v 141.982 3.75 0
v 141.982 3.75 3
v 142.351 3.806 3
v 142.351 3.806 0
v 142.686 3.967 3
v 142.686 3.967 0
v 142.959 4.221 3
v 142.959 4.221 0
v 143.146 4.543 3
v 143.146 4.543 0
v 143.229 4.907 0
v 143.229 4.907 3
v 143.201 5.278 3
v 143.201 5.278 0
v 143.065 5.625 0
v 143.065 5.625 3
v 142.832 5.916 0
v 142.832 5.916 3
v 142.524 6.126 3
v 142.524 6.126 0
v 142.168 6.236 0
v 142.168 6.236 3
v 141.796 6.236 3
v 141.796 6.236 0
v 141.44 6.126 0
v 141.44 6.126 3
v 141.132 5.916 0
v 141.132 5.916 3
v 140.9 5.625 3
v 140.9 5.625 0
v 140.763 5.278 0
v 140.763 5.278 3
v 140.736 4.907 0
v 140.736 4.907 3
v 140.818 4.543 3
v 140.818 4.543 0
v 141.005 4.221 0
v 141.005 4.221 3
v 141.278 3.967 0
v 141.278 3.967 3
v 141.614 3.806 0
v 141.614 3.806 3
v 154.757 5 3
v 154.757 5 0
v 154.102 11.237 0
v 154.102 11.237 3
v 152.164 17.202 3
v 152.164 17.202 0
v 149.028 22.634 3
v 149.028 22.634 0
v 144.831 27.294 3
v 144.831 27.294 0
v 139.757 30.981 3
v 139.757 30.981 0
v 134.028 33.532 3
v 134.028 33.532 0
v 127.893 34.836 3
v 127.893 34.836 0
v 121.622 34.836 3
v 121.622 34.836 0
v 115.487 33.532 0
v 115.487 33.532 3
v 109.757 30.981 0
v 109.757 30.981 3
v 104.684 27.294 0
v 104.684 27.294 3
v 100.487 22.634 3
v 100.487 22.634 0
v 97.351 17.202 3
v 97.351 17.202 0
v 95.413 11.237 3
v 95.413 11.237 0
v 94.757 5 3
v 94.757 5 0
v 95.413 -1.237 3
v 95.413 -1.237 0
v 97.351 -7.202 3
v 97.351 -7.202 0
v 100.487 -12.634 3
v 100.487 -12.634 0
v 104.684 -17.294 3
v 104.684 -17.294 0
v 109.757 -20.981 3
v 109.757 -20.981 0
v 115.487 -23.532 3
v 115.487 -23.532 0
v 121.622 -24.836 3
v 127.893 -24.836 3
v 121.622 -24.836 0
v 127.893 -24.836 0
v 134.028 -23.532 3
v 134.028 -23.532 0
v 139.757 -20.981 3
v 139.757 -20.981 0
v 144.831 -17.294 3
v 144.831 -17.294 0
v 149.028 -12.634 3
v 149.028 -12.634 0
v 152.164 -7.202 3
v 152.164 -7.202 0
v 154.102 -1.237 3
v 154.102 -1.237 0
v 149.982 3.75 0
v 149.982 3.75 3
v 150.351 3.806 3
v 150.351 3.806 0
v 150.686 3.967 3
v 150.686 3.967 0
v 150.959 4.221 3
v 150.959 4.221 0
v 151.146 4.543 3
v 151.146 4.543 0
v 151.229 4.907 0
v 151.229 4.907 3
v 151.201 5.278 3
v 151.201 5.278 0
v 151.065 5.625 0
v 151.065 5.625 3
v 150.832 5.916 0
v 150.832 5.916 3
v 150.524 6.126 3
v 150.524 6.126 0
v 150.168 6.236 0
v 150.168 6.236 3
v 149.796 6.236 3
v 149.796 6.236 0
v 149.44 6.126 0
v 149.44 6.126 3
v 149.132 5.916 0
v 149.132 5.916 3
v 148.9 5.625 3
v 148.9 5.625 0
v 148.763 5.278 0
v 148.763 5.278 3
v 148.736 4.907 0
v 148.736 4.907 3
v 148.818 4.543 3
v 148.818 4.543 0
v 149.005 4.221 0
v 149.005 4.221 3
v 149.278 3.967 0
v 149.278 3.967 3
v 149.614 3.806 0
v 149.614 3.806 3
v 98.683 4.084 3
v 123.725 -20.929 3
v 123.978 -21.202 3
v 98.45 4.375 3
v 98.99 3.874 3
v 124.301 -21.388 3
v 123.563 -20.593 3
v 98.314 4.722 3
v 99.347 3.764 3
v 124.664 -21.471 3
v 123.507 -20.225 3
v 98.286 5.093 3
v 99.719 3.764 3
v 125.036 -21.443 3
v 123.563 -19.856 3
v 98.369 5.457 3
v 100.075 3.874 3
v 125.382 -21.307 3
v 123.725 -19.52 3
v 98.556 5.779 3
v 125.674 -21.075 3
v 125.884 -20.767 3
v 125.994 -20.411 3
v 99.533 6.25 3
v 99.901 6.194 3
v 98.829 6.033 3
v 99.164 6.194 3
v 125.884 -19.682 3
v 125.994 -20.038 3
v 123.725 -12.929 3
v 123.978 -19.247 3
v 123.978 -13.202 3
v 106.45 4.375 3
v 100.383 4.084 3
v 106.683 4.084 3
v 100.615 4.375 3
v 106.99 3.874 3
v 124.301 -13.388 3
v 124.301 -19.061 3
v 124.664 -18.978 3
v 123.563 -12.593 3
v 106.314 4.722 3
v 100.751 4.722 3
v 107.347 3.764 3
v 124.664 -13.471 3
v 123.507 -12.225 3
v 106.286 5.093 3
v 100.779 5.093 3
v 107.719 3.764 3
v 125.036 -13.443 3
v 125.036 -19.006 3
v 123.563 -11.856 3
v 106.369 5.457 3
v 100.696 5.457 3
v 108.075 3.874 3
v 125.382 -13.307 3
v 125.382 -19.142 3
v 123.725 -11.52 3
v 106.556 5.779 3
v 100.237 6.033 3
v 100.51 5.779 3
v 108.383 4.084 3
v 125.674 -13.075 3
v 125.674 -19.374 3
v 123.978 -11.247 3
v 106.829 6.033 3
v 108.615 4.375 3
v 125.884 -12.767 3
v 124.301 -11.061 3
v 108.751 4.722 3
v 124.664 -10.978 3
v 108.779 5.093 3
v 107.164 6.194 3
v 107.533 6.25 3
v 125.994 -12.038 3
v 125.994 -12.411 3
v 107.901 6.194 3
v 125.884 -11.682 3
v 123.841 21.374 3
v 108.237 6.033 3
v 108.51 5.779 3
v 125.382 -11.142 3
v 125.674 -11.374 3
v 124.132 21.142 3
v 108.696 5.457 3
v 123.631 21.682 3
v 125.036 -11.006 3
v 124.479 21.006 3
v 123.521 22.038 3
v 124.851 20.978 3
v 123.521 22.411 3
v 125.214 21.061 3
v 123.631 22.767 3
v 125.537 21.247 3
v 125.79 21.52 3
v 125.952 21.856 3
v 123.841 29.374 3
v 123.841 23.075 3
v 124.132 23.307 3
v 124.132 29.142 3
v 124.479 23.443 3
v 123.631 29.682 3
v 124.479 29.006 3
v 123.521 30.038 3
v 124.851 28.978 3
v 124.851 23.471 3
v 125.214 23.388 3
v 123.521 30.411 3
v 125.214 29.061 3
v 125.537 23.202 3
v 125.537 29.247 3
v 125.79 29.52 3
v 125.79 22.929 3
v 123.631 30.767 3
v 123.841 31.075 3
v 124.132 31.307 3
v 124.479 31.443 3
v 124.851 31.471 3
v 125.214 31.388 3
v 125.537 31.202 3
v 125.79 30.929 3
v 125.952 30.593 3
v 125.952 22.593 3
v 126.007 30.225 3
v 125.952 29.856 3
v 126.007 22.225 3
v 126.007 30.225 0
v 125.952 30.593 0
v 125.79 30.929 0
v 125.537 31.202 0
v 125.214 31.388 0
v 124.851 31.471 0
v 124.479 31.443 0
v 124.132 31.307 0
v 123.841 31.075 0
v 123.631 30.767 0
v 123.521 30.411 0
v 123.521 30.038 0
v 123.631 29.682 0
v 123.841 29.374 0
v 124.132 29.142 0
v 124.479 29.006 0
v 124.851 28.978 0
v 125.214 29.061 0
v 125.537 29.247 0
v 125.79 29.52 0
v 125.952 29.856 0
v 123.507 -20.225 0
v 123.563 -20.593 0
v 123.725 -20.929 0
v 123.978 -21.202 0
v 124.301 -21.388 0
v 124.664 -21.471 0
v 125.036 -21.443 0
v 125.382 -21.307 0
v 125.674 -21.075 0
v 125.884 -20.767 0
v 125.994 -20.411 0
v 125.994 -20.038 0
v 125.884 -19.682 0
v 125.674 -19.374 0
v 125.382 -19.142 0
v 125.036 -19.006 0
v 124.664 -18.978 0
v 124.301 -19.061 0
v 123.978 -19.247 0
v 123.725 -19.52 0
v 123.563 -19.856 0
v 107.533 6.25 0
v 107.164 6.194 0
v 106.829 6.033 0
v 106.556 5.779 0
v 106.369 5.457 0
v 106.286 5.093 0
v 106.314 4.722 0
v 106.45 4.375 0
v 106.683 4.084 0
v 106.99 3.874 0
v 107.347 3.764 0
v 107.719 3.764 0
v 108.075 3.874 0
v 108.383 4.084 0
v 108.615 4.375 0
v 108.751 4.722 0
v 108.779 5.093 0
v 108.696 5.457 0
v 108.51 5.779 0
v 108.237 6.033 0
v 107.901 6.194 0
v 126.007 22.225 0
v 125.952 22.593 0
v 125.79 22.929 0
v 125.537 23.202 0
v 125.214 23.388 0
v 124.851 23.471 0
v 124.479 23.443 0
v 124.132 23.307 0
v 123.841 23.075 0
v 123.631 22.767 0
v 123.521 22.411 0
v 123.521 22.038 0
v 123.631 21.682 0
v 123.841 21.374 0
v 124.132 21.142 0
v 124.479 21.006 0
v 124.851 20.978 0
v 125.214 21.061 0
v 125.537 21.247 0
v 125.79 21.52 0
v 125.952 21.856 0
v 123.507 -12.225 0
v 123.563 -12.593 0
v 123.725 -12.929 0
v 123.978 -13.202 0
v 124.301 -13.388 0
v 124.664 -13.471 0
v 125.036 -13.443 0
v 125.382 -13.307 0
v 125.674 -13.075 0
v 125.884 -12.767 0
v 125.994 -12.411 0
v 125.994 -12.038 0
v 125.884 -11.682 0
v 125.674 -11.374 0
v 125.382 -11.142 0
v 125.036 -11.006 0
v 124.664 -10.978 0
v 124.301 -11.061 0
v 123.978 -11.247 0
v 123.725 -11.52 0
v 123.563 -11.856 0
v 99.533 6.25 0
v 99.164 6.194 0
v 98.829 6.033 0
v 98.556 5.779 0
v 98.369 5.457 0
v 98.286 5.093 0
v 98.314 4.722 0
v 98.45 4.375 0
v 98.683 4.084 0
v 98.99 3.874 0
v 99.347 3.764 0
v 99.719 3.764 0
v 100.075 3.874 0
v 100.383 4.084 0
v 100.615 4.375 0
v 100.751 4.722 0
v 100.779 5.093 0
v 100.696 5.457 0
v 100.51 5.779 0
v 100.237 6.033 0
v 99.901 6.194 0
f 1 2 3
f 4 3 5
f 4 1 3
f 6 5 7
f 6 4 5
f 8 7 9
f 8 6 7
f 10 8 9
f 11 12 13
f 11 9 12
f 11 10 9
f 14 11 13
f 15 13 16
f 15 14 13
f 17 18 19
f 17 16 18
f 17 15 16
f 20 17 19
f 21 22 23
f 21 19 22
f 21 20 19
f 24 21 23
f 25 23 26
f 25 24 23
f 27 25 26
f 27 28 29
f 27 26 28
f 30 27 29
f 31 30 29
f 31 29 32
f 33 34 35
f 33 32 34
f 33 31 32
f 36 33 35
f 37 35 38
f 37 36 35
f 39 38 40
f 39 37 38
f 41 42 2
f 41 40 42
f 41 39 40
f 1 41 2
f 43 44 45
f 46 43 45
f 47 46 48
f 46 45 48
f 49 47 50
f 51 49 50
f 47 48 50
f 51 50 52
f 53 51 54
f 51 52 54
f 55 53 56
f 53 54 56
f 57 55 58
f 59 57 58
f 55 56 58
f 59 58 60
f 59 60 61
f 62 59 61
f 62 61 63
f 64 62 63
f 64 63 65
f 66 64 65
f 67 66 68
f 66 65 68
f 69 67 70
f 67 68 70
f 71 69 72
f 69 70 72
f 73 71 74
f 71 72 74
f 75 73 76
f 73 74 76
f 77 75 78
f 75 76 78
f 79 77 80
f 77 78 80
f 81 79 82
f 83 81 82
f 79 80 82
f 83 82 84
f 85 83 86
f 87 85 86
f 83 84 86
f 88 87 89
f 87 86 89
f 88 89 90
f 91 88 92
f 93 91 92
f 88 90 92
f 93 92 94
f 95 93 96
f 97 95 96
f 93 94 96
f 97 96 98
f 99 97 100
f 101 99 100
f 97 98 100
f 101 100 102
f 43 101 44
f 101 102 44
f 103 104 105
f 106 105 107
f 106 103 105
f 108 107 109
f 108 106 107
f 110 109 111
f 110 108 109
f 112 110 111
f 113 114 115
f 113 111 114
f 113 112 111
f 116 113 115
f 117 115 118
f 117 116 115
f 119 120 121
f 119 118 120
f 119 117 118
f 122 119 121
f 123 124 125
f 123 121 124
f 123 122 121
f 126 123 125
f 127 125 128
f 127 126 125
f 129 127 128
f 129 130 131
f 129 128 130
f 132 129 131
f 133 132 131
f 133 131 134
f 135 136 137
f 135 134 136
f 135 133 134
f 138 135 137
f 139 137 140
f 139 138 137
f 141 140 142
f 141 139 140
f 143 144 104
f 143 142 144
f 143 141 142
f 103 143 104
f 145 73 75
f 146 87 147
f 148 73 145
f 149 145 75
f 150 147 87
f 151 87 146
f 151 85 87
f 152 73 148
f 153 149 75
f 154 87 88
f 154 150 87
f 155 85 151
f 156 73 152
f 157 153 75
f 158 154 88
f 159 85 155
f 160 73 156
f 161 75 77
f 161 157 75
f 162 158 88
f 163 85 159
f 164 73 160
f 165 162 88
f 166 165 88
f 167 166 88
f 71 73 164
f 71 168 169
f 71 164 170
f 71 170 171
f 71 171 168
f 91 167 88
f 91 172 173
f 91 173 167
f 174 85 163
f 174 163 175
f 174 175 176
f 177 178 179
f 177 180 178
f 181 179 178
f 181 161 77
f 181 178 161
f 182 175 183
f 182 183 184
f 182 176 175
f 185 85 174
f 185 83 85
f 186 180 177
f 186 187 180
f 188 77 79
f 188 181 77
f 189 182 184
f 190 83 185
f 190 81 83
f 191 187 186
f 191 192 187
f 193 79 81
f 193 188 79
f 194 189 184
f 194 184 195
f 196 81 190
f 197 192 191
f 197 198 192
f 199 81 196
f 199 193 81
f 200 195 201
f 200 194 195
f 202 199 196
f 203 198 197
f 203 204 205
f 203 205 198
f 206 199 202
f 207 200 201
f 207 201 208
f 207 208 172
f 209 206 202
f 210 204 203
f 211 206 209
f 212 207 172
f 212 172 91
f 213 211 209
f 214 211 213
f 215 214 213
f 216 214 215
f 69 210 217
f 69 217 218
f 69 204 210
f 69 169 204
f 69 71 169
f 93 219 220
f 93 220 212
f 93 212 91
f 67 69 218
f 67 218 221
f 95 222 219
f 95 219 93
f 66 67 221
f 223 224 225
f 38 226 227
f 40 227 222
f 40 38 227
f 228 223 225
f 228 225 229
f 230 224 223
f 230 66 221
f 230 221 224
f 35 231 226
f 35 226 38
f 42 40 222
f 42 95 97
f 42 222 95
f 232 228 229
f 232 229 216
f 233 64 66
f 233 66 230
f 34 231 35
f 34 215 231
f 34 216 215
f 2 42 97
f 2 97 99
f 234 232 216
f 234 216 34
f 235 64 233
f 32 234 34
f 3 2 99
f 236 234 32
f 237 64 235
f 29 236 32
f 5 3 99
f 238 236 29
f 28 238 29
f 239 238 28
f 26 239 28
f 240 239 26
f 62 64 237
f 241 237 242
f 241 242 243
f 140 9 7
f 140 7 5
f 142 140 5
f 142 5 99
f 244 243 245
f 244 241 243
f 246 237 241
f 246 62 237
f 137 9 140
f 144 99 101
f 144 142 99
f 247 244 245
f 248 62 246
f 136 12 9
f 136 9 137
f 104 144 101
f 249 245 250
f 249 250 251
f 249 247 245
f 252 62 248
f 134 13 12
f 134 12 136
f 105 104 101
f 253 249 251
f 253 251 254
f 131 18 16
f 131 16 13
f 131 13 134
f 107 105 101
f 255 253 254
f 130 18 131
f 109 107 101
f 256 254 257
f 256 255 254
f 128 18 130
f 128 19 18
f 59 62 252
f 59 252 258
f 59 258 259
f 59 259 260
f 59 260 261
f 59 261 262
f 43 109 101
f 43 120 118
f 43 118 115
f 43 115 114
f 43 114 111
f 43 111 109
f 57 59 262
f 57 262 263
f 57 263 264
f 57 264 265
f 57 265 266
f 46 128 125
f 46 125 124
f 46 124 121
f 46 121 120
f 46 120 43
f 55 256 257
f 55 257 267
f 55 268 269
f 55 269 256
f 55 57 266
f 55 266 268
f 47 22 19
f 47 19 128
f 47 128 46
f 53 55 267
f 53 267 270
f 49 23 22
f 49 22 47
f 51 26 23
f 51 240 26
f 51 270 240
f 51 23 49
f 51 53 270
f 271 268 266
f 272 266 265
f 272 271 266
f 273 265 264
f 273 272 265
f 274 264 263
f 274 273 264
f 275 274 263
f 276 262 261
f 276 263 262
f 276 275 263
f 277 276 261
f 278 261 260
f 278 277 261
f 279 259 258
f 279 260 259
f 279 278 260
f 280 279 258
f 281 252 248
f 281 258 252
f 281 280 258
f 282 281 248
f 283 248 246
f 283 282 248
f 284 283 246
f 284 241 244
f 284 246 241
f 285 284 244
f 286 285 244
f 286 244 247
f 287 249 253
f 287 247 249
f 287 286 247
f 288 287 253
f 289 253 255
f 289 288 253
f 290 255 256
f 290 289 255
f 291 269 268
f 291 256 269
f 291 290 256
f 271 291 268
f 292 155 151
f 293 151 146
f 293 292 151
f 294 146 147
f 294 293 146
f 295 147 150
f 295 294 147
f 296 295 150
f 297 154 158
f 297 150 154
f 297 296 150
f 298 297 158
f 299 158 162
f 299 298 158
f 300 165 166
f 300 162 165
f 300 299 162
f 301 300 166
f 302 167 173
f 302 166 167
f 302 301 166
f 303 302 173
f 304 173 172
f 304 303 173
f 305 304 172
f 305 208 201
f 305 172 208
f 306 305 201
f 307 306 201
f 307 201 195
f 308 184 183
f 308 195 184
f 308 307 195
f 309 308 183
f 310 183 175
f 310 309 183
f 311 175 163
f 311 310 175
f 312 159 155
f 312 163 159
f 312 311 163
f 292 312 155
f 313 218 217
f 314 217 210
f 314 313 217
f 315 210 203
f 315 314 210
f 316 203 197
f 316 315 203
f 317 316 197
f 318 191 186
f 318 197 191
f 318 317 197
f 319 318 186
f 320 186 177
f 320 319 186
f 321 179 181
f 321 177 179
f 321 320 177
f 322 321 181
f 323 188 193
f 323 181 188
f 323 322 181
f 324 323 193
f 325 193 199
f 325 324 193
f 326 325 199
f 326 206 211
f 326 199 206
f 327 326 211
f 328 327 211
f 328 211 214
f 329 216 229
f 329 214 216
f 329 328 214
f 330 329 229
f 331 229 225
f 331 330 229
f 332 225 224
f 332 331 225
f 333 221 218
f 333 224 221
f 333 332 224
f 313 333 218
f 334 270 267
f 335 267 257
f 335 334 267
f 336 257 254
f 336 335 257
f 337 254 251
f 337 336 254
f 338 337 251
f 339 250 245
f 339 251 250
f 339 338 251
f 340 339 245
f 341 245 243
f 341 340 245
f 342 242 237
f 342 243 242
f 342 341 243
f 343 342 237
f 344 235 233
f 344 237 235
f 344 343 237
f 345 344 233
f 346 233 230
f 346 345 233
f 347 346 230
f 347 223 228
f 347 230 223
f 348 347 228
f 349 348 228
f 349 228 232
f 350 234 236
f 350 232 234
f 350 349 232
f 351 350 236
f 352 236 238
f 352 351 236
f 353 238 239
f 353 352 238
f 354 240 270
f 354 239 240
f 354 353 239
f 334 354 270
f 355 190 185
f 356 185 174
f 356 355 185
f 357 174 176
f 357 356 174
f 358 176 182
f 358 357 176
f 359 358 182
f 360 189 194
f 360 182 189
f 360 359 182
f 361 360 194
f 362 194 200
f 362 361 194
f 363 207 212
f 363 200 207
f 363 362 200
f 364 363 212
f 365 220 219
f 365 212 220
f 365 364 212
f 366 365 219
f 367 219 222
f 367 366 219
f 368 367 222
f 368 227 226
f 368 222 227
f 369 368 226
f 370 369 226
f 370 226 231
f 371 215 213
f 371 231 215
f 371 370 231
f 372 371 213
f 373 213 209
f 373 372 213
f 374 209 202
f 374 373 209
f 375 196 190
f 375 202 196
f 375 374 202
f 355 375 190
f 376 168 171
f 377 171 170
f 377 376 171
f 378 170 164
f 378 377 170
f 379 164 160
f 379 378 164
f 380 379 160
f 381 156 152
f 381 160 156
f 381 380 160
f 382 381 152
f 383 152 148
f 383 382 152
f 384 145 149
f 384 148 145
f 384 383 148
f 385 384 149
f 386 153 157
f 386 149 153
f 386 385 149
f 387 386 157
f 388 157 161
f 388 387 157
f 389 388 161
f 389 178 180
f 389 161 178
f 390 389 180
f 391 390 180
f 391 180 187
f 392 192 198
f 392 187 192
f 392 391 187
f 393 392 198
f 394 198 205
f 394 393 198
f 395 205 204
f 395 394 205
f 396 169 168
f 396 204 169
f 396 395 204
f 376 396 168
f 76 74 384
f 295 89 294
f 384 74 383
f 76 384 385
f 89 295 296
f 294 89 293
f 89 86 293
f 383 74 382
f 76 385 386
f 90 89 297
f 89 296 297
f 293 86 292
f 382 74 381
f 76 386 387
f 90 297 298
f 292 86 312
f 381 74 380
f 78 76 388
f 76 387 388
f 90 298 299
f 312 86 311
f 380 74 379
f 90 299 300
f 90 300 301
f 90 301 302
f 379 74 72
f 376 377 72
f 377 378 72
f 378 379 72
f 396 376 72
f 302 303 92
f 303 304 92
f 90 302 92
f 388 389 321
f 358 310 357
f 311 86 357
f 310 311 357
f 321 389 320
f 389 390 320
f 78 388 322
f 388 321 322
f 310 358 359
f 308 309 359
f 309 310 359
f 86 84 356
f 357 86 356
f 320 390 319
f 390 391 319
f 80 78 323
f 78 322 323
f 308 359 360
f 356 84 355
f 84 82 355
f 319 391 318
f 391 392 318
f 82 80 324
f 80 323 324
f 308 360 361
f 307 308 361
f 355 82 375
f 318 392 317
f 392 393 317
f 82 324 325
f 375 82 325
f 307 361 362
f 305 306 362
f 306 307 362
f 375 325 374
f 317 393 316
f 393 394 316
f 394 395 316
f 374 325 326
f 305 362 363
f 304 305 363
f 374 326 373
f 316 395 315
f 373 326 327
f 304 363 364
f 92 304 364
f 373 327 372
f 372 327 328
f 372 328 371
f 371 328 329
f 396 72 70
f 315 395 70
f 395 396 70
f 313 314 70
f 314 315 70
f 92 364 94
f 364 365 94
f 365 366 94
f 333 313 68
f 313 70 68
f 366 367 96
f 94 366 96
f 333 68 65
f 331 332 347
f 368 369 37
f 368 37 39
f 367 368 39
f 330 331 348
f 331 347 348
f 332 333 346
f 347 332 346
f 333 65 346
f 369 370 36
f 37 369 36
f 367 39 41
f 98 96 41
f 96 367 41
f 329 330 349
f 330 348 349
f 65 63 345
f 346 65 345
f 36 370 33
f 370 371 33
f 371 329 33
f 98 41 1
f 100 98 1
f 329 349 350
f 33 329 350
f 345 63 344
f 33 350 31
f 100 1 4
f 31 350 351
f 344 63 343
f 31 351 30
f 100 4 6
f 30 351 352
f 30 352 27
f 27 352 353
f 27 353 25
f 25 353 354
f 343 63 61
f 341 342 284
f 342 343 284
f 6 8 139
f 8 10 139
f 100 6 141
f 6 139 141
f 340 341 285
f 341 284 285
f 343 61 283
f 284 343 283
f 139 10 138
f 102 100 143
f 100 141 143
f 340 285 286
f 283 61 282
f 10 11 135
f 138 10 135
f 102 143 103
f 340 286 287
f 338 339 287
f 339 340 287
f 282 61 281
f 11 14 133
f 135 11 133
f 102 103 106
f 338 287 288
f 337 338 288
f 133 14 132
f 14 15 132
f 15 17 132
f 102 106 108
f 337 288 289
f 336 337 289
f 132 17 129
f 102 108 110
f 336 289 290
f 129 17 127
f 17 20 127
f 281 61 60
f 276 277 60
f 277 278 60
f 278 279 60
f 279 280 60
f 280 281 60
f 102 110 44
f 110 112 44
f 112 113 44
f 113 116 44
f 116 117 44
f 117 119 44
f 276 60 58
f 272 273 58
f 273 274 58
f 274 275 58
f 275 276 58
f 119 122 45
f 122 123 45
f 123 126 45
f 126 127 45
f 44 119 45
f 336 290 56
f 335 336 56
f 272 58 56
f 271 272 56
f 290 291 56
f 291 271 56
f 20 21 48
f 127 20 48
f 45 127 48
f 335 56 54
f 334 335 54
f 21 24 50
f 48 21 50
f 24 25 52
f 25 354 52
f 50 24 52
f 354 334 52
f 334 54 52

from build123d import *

# Parameters (mm, degrees)
SKETCH1_R           = 30
BOSS_EXTRUDE1_DEPTH = 3
LPATTERN1_COUNT     = 2
LPATTERN1_PITCH     = 8


with BuildPart() as part:
    # Sketch1 → Boss-Extrude1 (new body)
    with BuildSketch(Plane.XY):
        with Locations((124.757462076, 5)):
            Circle(SKETCH1_R)
    extrude(amount=BOSS_EXTRUDE1_DEPTH)

    # Sketch2 → M3 Tapped Hole1 (revolve, cut)
    with BuildSketch(Plane(origin=(107.532834786, 5, 0), x_dir=(0, 1, 0), z_dir=(1, 0, 0))):
        Polygon((0, 0), (0, 8.251075774), (1.25, 7.5), (1.25, 0), align=None)
    m3_tapped_hole1 = revolve(axis=Axis((107.532834786, 5, -6.35), (0, 0, 1)), mode=Mode.SUBTRACT)

    # LPattern1: M3 Tapped Hole1 ×2
    with Locations(*[(-i * LPATTERN1_PITCH, 0, 0) for i in range(1, LPATTERN1_COUNT)]):
        add(m3_tapped_hole1, mode=Mode.SUBTRACT)

    # CirPattern1 copy 1 sketch → CirPattern1 copy 1 (revolve, cut)
    with BuildSketch(Plane(origin=(124.757462076, 30.22462729, 0), x_dir=(1, 0, 0), z_dir=(0, -1, 0))):
        Polygon((0, 0), (0, 8.251075774), (1.25, 7.5), (1.25, 0), align=None)
    revolve(axis=Axis((124.757462076, 30.22462729, -6.35), (0, 0, 1)), mode=Mode.SUBTRACT)

    # CirPattern1 copy 2 sketch → CirPattern1 copy 2 (revolve, cut)
    with BuildSketch(Plane(origin=(149.982089365, 5, 0), x_dir=(0, -1, 0), z_dir=(-1, 0, 0))):
        Polygon((0, 0), (0, 8.251075774), (1.25, 7.5), (1.25, 0), align=None)
    revolve(axis=Axis((149.982089365, 5, -6.35), (0, 0, 1)), mode=Mode.SUBTRACT)

    # CirPattern1 copy 3 sketch → CirPattern1 copy 3 (revolve, cut)
    with BuildSketch(Plane(origin=(124.757462076, -20.22462729, 0), x_dir=(-1, 0, 0), z_dir=(0, 1, 0))):
        Polygon((0, 0), (0, 8.251075774), (1.25, 7.5), (1.25, 0), align=None)
    revolve(axis=Axis((124.757462076, -20.22462729, -6.35), (0, 0, 1)), mode=Mode.SUBTRACT)

    # CirPattern1 copy 4 sketch → CirPattern1 copy 4 (revolve, cut)
    with BuildSketch(Plane(origin=(124.757462076, 22.22462729, 0), x_dir=(1, 0, 0), z_dir=(0, -1, 0))):
        Polygon((0, 0), (0, 8.251075774), (1.25, 7.5), (1.25, 0), align=None)
    revolve(axis=Axis((124.757462076, 22.22462729, -6.35), (0, 0, 1)), mode=Mode.SUBTRACT)

    # CirPattern1 copy 5 sketch → CirPattern1 copy 5 (revolve, cut)
    with BuildSketch(Plane(origin=(141.982089365, 5, 0), x_dir=(0, -1, 0), z_dir=(-1, 0, 0))):
        Polygon((0, 0), (0, 8.251075774), (1.25, 7.5), (1.25, 0), align=None)
    revolve(axis=Axis((141.982089365, 5, -6.35), (0, 0, 1)), mode=Mode.SUBTRACT)

    # CirPattern1 copy 6 sketch → CirPattern1 copy 6 (revolve, cut)
    with BuildSketch(Plane(origin=(124.757462076, -12.22462729, 0), x_dir=(-1, 0, 0), z_dir=(0, 1, 0))):
        Polygon((0, 0), (0, 8.251075774), (1.25, 7.5), (1.25, 0), align=None)
    revolve(axis=Axis((124.757462076, -12.22462729, -6.35), (0, 0, 1)), mode=Mode.SUBTRACT)


solid = part.part
